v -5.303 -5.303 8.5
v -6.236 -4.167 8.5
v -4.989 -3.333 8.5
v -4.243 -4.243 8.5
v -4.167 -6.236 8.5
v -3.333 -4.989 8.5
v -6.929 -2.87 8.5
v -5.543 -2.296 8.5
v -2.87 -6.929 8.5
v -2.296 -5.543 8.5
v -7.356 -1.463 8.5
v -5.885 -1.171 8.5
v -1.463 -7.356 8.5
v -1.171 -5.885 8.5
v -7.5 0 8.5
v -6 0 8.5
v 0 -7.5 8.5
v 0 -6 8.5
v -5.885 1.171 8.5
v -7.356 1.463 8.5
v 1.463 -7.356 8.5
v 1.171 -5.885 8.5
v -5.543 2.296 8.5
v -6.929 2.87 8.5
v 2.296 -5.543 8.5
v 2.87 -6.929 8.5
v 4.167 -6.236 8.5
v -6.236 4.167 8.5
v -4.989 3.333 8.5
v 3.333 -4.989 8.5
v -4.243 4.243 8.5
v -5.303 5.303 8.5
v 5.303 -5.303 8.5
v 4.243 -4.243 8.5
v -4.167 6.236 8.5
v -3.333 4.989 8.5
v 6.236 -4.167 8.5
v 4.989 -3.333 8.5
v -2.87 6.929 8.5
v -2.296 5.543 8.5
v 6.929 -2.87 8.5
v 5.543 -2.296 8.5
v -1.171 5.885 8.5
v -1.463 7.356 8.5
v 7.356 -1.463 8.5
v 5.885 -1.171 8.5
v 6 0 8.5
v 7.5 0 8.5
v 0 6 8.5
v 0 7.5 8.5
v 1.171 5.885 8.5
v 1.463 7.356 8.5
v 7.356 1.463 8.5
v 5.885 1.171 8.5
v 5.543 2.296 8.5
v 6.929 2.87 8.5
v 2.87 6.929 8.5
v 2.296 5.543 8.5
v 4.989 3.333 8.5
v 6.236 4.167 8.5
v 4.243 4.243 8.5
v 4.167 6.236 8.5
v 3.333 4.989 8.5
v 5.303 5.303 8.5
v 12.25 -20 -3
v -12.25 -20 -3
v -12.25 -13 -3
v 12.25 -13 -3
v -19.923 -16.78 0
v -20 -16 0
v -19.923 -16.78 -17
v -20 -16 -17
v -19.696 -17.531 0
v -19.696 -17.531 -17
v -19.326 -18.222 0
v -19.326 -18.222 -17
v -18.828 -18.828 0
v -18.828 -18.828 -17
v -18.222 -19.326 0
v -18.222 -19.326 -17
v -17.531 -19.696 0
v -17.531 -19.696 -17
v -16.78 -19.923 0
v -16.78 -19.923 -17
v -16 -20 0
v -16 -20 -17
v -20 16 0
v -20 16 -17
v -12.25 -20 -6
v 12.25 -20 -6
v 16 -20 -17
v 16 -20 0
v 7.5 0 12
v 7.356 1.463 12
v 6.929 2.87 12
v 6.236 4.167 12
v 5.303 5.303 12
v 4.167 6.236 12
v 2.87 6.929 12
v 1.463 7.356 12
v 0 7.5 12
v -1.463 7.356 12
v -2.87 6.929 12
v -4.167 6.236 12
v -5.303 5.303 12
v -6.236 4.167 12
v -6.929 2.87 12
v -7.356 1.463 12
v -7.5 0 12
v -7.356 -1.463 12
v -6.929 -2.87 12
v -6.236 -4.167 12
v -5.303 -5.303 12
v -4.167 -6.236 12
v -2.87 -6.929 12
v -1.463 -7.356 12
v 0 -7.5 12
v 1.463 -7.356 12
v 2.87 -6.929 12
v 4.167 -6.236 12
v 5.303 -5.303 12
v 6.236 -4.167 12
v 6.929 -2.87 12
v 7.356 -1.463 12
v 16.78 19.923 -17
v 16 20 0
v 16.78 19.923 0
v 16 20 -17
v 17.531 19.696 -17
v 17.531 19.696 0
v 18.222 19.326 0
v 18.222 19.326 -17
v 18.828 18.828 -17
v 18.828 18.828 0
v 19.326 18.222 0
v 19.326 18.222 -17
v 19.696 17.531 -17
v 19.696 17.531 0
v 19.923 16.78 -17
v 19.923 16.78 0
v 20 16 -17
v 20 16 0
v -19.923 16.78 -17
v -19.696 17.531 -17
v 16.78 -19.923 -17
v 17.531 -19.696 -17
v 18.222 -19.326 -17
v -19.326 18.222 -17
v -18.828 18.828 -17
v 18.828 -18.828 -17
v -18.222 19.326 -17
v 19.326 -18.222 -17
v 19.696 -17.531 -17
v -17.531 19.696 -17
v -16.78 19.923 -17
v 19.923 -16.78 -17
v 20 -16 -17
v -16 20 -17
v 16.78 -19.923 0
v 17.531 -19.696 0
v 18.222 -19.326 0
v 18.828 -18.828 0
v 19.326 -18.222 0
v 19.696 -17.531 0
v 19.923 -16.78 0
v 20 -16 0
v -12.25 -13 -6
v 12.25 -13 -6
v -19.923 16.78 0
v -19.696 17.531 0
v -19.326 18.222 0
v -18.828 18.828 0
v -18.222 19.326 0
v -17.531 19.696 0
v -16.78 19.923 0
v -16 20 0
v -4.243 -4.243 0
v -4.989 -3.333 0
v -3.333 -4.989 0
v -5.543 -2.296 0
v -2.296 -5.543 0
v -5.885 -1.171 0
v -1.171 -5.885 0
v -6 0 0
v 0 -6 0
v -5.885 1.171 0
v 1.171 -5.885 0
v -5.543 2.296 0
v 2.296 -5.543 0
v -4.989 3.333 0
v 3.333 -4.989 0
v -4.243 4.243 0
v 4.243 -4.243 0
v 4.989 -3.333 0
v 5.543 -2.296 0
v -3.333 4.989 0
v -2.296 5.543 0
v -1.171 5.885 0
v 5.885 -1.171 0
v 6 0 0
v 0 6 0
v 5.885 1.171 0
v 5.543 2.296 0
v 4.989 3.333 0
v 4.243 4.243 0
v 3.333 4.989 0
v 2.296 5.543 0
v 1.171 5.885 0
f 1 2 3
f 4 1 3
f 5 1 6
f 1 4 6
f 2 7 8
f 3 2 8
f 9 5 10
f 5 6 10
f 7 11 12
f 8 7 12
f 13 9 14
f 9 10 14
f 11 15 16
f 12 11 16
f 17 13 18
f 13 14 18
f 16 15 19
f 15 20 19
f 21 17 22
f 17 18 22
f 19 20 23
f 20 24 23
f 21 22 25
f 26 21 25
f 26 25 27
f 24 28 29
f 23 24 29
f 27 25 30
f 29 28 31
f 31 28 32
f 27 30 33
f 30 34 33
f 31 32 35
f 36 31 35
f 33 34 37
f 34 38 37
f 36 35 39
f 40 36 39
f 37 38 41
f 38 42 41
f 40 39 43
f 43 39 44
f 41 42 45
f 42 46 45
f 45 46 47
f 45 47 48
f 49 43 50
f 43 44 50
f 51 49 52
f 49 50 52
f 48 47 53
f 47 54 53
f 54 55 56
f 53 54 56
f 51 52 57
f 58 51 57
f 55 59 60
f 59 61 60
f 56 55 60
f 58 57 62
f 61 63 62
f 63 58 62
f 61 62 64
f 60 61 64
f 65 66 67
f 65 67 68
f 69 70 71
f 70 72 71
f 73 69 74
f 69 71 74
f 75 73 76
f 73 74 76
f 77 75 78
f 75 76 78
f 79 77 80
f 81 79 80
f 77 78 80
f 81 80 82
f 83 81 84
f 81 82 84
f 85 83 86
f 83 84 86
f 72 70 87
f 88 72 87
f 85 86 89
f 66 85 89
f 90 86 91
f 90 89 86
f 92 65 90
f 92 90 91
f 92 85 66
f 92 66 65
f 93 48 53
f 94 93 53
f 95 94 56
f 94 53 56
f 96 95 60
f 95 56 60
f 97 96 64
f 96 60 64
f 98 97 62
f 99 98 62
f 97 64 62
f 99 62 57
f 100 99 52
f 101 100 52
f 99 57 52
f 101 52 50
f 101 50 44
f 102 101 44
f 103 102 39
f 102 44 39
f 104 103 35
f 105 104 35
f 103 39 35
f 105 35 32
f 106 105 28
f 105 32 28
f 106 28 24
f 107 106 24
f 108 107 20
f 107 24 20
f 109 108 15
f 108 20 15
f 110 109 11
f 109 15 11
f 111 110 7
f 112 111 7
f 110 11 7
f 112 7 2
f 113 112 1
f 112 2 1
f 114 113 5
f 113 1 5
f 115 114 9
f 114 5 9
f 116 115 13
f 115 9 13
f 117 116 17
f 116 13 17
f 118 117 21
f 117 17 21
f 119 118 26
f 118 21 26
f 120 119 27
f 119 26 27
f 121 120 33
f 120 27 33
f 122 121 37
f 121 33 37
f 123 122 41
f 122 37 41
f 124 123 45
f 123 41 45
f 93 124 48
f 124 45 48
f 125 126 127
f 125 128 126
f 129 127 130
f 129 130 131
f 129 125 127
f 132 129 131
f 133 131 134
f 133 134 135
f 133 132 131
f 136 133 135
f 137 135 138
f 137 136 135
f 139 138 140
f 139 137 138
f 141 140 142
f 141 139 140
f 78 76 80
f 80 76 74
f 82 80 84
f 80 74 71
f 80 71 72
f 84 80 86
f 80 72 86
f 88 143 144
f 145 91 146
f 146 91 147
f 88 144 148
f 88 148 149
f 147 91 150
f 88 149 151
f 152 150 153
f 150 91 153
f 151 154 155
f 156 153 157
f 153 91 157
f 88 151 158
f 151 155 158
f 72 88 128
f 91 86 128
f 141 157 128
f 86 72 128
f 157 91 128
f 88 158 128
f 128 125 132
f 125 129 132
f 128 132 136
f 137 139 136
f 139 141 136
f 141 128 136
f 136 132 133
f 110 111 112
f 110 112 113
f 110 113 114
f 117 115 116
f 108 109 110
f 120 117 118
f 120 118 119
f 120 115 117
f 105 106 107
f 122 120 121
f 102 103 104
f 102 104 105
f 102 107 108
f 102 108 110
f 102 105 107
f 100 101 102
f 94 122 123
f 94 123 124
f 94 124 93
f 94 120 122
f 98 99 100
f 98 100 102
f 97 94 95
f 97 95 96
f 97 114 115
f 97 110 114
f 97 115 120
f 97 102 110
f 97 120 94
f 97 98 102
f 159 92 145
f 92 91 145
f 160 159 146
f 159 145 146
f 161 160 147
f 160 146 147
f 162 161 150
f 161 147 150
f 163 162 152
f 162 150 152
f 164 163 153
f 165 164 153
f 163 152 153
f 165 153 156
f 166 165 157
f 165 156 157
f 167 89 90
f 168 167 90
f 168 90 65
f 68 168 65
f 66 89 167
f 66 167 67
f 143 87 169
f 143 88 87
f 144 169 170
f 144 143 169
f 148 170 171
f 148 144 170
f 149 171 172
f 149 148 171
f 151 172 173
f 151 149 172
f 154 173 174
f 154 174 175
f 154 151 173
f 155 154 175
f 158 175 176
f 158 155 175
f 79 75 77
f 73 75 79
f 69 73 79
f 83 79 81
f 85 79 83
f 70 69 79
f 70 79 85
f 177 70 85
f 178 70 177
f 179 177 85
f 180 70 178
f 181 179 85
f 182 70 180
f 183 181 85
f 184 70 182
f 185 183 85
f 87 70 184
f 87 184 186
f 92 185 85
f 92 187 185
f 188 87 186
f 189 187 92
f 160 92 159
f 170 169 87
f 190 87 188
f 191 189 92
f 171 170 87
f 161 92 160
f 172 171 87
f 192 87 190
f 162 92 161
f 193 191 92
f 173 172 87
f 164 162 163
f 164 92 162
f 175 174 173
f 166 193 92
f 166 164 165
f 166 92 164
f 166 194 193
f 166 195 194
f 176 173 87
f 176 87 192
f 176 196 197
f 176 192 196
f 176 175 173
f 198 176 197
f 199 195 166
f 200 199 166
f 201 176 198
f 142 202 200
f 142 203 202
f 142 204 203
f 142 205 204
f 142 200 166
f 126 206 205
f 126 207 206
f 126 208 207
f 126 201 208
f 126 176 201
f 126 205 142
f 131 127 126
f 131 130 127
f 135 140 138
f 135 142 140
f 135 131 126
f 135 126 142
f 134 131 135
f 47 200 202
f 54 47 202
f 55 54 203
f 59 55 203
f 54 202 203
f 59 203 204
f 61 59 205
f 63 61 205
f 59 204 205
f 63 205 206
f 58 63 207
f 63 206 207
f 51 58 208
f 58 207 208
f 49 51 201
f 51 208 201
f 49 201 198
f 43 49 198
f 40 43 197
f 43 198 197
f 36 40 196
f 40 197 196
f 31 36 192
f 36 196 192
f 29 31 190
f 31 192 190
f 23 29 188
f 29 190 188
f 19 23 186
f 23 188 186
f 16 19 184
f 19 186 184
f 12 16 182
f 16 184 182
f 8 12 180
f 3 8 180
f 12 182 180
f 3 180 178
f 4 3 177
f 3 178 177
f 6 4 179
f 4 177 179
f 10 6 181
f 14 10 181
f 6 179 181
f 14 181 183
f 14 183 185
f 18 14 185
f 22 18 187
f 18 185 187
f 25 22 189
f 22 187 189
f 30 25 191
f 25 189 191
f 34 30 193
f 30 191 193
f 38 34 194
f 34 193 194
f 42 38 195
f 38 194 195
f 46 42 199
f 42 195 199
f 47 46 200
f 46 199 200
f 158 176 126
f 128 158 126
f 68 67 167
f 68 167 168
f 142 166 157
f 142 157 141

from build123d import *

# Parameters (mm, degrees)
F0_W     = 40
F0_H     = 40
F1_DEPTH = 17
F2_R     = 6
F3_DEPTH = 8.5
F4_R     = 7.5
F5_DEPTH = 3.5
F6_R     = 4
F7_W     = 24.5
F7_H     = 3
F8_DEPTH = 7


with BuildPart() as f1:
    # F0 (on Top) → F1 (new body)
    with BuildSketch(Plane.XY):
        Rectangle(F0_W, F0_H)
    extrude(amount=-F1_DEPTH)

    # F2 (on face) → F3 (join)
    with BuildSketch(Plane.XY):
        Circle(F2_R)
    extrude(amount=F3_DEPTH)

    # F4 (on face) → F5 (join)
    with BuildSketch(Plane.XY.offset(8.5)):
        Circle(F4_R)
    extrude(amount=F5_DEPTH)

    # F6
    f6_edges = [f1.edges().sort_by_distance(p)[0] for p in [
        (20, -20, -8.5),
        (20, 20, -8.5),
        (-20, 20, -8.5),
        (-20, -20, -8.5),
    ]]
    fillet(f6_edges, radius=F6_R)

    # F7 (on face) → F8 (cut)
    with BuildSketch(Plane.XZ.offset(20)):
        with Locations((0, -4.5)):
            Rectangle(F7_W, F7_H)
    extrude(amount=-F8_DEPTH, mode=Mode.SUBTRACT)


solid = f1.part
